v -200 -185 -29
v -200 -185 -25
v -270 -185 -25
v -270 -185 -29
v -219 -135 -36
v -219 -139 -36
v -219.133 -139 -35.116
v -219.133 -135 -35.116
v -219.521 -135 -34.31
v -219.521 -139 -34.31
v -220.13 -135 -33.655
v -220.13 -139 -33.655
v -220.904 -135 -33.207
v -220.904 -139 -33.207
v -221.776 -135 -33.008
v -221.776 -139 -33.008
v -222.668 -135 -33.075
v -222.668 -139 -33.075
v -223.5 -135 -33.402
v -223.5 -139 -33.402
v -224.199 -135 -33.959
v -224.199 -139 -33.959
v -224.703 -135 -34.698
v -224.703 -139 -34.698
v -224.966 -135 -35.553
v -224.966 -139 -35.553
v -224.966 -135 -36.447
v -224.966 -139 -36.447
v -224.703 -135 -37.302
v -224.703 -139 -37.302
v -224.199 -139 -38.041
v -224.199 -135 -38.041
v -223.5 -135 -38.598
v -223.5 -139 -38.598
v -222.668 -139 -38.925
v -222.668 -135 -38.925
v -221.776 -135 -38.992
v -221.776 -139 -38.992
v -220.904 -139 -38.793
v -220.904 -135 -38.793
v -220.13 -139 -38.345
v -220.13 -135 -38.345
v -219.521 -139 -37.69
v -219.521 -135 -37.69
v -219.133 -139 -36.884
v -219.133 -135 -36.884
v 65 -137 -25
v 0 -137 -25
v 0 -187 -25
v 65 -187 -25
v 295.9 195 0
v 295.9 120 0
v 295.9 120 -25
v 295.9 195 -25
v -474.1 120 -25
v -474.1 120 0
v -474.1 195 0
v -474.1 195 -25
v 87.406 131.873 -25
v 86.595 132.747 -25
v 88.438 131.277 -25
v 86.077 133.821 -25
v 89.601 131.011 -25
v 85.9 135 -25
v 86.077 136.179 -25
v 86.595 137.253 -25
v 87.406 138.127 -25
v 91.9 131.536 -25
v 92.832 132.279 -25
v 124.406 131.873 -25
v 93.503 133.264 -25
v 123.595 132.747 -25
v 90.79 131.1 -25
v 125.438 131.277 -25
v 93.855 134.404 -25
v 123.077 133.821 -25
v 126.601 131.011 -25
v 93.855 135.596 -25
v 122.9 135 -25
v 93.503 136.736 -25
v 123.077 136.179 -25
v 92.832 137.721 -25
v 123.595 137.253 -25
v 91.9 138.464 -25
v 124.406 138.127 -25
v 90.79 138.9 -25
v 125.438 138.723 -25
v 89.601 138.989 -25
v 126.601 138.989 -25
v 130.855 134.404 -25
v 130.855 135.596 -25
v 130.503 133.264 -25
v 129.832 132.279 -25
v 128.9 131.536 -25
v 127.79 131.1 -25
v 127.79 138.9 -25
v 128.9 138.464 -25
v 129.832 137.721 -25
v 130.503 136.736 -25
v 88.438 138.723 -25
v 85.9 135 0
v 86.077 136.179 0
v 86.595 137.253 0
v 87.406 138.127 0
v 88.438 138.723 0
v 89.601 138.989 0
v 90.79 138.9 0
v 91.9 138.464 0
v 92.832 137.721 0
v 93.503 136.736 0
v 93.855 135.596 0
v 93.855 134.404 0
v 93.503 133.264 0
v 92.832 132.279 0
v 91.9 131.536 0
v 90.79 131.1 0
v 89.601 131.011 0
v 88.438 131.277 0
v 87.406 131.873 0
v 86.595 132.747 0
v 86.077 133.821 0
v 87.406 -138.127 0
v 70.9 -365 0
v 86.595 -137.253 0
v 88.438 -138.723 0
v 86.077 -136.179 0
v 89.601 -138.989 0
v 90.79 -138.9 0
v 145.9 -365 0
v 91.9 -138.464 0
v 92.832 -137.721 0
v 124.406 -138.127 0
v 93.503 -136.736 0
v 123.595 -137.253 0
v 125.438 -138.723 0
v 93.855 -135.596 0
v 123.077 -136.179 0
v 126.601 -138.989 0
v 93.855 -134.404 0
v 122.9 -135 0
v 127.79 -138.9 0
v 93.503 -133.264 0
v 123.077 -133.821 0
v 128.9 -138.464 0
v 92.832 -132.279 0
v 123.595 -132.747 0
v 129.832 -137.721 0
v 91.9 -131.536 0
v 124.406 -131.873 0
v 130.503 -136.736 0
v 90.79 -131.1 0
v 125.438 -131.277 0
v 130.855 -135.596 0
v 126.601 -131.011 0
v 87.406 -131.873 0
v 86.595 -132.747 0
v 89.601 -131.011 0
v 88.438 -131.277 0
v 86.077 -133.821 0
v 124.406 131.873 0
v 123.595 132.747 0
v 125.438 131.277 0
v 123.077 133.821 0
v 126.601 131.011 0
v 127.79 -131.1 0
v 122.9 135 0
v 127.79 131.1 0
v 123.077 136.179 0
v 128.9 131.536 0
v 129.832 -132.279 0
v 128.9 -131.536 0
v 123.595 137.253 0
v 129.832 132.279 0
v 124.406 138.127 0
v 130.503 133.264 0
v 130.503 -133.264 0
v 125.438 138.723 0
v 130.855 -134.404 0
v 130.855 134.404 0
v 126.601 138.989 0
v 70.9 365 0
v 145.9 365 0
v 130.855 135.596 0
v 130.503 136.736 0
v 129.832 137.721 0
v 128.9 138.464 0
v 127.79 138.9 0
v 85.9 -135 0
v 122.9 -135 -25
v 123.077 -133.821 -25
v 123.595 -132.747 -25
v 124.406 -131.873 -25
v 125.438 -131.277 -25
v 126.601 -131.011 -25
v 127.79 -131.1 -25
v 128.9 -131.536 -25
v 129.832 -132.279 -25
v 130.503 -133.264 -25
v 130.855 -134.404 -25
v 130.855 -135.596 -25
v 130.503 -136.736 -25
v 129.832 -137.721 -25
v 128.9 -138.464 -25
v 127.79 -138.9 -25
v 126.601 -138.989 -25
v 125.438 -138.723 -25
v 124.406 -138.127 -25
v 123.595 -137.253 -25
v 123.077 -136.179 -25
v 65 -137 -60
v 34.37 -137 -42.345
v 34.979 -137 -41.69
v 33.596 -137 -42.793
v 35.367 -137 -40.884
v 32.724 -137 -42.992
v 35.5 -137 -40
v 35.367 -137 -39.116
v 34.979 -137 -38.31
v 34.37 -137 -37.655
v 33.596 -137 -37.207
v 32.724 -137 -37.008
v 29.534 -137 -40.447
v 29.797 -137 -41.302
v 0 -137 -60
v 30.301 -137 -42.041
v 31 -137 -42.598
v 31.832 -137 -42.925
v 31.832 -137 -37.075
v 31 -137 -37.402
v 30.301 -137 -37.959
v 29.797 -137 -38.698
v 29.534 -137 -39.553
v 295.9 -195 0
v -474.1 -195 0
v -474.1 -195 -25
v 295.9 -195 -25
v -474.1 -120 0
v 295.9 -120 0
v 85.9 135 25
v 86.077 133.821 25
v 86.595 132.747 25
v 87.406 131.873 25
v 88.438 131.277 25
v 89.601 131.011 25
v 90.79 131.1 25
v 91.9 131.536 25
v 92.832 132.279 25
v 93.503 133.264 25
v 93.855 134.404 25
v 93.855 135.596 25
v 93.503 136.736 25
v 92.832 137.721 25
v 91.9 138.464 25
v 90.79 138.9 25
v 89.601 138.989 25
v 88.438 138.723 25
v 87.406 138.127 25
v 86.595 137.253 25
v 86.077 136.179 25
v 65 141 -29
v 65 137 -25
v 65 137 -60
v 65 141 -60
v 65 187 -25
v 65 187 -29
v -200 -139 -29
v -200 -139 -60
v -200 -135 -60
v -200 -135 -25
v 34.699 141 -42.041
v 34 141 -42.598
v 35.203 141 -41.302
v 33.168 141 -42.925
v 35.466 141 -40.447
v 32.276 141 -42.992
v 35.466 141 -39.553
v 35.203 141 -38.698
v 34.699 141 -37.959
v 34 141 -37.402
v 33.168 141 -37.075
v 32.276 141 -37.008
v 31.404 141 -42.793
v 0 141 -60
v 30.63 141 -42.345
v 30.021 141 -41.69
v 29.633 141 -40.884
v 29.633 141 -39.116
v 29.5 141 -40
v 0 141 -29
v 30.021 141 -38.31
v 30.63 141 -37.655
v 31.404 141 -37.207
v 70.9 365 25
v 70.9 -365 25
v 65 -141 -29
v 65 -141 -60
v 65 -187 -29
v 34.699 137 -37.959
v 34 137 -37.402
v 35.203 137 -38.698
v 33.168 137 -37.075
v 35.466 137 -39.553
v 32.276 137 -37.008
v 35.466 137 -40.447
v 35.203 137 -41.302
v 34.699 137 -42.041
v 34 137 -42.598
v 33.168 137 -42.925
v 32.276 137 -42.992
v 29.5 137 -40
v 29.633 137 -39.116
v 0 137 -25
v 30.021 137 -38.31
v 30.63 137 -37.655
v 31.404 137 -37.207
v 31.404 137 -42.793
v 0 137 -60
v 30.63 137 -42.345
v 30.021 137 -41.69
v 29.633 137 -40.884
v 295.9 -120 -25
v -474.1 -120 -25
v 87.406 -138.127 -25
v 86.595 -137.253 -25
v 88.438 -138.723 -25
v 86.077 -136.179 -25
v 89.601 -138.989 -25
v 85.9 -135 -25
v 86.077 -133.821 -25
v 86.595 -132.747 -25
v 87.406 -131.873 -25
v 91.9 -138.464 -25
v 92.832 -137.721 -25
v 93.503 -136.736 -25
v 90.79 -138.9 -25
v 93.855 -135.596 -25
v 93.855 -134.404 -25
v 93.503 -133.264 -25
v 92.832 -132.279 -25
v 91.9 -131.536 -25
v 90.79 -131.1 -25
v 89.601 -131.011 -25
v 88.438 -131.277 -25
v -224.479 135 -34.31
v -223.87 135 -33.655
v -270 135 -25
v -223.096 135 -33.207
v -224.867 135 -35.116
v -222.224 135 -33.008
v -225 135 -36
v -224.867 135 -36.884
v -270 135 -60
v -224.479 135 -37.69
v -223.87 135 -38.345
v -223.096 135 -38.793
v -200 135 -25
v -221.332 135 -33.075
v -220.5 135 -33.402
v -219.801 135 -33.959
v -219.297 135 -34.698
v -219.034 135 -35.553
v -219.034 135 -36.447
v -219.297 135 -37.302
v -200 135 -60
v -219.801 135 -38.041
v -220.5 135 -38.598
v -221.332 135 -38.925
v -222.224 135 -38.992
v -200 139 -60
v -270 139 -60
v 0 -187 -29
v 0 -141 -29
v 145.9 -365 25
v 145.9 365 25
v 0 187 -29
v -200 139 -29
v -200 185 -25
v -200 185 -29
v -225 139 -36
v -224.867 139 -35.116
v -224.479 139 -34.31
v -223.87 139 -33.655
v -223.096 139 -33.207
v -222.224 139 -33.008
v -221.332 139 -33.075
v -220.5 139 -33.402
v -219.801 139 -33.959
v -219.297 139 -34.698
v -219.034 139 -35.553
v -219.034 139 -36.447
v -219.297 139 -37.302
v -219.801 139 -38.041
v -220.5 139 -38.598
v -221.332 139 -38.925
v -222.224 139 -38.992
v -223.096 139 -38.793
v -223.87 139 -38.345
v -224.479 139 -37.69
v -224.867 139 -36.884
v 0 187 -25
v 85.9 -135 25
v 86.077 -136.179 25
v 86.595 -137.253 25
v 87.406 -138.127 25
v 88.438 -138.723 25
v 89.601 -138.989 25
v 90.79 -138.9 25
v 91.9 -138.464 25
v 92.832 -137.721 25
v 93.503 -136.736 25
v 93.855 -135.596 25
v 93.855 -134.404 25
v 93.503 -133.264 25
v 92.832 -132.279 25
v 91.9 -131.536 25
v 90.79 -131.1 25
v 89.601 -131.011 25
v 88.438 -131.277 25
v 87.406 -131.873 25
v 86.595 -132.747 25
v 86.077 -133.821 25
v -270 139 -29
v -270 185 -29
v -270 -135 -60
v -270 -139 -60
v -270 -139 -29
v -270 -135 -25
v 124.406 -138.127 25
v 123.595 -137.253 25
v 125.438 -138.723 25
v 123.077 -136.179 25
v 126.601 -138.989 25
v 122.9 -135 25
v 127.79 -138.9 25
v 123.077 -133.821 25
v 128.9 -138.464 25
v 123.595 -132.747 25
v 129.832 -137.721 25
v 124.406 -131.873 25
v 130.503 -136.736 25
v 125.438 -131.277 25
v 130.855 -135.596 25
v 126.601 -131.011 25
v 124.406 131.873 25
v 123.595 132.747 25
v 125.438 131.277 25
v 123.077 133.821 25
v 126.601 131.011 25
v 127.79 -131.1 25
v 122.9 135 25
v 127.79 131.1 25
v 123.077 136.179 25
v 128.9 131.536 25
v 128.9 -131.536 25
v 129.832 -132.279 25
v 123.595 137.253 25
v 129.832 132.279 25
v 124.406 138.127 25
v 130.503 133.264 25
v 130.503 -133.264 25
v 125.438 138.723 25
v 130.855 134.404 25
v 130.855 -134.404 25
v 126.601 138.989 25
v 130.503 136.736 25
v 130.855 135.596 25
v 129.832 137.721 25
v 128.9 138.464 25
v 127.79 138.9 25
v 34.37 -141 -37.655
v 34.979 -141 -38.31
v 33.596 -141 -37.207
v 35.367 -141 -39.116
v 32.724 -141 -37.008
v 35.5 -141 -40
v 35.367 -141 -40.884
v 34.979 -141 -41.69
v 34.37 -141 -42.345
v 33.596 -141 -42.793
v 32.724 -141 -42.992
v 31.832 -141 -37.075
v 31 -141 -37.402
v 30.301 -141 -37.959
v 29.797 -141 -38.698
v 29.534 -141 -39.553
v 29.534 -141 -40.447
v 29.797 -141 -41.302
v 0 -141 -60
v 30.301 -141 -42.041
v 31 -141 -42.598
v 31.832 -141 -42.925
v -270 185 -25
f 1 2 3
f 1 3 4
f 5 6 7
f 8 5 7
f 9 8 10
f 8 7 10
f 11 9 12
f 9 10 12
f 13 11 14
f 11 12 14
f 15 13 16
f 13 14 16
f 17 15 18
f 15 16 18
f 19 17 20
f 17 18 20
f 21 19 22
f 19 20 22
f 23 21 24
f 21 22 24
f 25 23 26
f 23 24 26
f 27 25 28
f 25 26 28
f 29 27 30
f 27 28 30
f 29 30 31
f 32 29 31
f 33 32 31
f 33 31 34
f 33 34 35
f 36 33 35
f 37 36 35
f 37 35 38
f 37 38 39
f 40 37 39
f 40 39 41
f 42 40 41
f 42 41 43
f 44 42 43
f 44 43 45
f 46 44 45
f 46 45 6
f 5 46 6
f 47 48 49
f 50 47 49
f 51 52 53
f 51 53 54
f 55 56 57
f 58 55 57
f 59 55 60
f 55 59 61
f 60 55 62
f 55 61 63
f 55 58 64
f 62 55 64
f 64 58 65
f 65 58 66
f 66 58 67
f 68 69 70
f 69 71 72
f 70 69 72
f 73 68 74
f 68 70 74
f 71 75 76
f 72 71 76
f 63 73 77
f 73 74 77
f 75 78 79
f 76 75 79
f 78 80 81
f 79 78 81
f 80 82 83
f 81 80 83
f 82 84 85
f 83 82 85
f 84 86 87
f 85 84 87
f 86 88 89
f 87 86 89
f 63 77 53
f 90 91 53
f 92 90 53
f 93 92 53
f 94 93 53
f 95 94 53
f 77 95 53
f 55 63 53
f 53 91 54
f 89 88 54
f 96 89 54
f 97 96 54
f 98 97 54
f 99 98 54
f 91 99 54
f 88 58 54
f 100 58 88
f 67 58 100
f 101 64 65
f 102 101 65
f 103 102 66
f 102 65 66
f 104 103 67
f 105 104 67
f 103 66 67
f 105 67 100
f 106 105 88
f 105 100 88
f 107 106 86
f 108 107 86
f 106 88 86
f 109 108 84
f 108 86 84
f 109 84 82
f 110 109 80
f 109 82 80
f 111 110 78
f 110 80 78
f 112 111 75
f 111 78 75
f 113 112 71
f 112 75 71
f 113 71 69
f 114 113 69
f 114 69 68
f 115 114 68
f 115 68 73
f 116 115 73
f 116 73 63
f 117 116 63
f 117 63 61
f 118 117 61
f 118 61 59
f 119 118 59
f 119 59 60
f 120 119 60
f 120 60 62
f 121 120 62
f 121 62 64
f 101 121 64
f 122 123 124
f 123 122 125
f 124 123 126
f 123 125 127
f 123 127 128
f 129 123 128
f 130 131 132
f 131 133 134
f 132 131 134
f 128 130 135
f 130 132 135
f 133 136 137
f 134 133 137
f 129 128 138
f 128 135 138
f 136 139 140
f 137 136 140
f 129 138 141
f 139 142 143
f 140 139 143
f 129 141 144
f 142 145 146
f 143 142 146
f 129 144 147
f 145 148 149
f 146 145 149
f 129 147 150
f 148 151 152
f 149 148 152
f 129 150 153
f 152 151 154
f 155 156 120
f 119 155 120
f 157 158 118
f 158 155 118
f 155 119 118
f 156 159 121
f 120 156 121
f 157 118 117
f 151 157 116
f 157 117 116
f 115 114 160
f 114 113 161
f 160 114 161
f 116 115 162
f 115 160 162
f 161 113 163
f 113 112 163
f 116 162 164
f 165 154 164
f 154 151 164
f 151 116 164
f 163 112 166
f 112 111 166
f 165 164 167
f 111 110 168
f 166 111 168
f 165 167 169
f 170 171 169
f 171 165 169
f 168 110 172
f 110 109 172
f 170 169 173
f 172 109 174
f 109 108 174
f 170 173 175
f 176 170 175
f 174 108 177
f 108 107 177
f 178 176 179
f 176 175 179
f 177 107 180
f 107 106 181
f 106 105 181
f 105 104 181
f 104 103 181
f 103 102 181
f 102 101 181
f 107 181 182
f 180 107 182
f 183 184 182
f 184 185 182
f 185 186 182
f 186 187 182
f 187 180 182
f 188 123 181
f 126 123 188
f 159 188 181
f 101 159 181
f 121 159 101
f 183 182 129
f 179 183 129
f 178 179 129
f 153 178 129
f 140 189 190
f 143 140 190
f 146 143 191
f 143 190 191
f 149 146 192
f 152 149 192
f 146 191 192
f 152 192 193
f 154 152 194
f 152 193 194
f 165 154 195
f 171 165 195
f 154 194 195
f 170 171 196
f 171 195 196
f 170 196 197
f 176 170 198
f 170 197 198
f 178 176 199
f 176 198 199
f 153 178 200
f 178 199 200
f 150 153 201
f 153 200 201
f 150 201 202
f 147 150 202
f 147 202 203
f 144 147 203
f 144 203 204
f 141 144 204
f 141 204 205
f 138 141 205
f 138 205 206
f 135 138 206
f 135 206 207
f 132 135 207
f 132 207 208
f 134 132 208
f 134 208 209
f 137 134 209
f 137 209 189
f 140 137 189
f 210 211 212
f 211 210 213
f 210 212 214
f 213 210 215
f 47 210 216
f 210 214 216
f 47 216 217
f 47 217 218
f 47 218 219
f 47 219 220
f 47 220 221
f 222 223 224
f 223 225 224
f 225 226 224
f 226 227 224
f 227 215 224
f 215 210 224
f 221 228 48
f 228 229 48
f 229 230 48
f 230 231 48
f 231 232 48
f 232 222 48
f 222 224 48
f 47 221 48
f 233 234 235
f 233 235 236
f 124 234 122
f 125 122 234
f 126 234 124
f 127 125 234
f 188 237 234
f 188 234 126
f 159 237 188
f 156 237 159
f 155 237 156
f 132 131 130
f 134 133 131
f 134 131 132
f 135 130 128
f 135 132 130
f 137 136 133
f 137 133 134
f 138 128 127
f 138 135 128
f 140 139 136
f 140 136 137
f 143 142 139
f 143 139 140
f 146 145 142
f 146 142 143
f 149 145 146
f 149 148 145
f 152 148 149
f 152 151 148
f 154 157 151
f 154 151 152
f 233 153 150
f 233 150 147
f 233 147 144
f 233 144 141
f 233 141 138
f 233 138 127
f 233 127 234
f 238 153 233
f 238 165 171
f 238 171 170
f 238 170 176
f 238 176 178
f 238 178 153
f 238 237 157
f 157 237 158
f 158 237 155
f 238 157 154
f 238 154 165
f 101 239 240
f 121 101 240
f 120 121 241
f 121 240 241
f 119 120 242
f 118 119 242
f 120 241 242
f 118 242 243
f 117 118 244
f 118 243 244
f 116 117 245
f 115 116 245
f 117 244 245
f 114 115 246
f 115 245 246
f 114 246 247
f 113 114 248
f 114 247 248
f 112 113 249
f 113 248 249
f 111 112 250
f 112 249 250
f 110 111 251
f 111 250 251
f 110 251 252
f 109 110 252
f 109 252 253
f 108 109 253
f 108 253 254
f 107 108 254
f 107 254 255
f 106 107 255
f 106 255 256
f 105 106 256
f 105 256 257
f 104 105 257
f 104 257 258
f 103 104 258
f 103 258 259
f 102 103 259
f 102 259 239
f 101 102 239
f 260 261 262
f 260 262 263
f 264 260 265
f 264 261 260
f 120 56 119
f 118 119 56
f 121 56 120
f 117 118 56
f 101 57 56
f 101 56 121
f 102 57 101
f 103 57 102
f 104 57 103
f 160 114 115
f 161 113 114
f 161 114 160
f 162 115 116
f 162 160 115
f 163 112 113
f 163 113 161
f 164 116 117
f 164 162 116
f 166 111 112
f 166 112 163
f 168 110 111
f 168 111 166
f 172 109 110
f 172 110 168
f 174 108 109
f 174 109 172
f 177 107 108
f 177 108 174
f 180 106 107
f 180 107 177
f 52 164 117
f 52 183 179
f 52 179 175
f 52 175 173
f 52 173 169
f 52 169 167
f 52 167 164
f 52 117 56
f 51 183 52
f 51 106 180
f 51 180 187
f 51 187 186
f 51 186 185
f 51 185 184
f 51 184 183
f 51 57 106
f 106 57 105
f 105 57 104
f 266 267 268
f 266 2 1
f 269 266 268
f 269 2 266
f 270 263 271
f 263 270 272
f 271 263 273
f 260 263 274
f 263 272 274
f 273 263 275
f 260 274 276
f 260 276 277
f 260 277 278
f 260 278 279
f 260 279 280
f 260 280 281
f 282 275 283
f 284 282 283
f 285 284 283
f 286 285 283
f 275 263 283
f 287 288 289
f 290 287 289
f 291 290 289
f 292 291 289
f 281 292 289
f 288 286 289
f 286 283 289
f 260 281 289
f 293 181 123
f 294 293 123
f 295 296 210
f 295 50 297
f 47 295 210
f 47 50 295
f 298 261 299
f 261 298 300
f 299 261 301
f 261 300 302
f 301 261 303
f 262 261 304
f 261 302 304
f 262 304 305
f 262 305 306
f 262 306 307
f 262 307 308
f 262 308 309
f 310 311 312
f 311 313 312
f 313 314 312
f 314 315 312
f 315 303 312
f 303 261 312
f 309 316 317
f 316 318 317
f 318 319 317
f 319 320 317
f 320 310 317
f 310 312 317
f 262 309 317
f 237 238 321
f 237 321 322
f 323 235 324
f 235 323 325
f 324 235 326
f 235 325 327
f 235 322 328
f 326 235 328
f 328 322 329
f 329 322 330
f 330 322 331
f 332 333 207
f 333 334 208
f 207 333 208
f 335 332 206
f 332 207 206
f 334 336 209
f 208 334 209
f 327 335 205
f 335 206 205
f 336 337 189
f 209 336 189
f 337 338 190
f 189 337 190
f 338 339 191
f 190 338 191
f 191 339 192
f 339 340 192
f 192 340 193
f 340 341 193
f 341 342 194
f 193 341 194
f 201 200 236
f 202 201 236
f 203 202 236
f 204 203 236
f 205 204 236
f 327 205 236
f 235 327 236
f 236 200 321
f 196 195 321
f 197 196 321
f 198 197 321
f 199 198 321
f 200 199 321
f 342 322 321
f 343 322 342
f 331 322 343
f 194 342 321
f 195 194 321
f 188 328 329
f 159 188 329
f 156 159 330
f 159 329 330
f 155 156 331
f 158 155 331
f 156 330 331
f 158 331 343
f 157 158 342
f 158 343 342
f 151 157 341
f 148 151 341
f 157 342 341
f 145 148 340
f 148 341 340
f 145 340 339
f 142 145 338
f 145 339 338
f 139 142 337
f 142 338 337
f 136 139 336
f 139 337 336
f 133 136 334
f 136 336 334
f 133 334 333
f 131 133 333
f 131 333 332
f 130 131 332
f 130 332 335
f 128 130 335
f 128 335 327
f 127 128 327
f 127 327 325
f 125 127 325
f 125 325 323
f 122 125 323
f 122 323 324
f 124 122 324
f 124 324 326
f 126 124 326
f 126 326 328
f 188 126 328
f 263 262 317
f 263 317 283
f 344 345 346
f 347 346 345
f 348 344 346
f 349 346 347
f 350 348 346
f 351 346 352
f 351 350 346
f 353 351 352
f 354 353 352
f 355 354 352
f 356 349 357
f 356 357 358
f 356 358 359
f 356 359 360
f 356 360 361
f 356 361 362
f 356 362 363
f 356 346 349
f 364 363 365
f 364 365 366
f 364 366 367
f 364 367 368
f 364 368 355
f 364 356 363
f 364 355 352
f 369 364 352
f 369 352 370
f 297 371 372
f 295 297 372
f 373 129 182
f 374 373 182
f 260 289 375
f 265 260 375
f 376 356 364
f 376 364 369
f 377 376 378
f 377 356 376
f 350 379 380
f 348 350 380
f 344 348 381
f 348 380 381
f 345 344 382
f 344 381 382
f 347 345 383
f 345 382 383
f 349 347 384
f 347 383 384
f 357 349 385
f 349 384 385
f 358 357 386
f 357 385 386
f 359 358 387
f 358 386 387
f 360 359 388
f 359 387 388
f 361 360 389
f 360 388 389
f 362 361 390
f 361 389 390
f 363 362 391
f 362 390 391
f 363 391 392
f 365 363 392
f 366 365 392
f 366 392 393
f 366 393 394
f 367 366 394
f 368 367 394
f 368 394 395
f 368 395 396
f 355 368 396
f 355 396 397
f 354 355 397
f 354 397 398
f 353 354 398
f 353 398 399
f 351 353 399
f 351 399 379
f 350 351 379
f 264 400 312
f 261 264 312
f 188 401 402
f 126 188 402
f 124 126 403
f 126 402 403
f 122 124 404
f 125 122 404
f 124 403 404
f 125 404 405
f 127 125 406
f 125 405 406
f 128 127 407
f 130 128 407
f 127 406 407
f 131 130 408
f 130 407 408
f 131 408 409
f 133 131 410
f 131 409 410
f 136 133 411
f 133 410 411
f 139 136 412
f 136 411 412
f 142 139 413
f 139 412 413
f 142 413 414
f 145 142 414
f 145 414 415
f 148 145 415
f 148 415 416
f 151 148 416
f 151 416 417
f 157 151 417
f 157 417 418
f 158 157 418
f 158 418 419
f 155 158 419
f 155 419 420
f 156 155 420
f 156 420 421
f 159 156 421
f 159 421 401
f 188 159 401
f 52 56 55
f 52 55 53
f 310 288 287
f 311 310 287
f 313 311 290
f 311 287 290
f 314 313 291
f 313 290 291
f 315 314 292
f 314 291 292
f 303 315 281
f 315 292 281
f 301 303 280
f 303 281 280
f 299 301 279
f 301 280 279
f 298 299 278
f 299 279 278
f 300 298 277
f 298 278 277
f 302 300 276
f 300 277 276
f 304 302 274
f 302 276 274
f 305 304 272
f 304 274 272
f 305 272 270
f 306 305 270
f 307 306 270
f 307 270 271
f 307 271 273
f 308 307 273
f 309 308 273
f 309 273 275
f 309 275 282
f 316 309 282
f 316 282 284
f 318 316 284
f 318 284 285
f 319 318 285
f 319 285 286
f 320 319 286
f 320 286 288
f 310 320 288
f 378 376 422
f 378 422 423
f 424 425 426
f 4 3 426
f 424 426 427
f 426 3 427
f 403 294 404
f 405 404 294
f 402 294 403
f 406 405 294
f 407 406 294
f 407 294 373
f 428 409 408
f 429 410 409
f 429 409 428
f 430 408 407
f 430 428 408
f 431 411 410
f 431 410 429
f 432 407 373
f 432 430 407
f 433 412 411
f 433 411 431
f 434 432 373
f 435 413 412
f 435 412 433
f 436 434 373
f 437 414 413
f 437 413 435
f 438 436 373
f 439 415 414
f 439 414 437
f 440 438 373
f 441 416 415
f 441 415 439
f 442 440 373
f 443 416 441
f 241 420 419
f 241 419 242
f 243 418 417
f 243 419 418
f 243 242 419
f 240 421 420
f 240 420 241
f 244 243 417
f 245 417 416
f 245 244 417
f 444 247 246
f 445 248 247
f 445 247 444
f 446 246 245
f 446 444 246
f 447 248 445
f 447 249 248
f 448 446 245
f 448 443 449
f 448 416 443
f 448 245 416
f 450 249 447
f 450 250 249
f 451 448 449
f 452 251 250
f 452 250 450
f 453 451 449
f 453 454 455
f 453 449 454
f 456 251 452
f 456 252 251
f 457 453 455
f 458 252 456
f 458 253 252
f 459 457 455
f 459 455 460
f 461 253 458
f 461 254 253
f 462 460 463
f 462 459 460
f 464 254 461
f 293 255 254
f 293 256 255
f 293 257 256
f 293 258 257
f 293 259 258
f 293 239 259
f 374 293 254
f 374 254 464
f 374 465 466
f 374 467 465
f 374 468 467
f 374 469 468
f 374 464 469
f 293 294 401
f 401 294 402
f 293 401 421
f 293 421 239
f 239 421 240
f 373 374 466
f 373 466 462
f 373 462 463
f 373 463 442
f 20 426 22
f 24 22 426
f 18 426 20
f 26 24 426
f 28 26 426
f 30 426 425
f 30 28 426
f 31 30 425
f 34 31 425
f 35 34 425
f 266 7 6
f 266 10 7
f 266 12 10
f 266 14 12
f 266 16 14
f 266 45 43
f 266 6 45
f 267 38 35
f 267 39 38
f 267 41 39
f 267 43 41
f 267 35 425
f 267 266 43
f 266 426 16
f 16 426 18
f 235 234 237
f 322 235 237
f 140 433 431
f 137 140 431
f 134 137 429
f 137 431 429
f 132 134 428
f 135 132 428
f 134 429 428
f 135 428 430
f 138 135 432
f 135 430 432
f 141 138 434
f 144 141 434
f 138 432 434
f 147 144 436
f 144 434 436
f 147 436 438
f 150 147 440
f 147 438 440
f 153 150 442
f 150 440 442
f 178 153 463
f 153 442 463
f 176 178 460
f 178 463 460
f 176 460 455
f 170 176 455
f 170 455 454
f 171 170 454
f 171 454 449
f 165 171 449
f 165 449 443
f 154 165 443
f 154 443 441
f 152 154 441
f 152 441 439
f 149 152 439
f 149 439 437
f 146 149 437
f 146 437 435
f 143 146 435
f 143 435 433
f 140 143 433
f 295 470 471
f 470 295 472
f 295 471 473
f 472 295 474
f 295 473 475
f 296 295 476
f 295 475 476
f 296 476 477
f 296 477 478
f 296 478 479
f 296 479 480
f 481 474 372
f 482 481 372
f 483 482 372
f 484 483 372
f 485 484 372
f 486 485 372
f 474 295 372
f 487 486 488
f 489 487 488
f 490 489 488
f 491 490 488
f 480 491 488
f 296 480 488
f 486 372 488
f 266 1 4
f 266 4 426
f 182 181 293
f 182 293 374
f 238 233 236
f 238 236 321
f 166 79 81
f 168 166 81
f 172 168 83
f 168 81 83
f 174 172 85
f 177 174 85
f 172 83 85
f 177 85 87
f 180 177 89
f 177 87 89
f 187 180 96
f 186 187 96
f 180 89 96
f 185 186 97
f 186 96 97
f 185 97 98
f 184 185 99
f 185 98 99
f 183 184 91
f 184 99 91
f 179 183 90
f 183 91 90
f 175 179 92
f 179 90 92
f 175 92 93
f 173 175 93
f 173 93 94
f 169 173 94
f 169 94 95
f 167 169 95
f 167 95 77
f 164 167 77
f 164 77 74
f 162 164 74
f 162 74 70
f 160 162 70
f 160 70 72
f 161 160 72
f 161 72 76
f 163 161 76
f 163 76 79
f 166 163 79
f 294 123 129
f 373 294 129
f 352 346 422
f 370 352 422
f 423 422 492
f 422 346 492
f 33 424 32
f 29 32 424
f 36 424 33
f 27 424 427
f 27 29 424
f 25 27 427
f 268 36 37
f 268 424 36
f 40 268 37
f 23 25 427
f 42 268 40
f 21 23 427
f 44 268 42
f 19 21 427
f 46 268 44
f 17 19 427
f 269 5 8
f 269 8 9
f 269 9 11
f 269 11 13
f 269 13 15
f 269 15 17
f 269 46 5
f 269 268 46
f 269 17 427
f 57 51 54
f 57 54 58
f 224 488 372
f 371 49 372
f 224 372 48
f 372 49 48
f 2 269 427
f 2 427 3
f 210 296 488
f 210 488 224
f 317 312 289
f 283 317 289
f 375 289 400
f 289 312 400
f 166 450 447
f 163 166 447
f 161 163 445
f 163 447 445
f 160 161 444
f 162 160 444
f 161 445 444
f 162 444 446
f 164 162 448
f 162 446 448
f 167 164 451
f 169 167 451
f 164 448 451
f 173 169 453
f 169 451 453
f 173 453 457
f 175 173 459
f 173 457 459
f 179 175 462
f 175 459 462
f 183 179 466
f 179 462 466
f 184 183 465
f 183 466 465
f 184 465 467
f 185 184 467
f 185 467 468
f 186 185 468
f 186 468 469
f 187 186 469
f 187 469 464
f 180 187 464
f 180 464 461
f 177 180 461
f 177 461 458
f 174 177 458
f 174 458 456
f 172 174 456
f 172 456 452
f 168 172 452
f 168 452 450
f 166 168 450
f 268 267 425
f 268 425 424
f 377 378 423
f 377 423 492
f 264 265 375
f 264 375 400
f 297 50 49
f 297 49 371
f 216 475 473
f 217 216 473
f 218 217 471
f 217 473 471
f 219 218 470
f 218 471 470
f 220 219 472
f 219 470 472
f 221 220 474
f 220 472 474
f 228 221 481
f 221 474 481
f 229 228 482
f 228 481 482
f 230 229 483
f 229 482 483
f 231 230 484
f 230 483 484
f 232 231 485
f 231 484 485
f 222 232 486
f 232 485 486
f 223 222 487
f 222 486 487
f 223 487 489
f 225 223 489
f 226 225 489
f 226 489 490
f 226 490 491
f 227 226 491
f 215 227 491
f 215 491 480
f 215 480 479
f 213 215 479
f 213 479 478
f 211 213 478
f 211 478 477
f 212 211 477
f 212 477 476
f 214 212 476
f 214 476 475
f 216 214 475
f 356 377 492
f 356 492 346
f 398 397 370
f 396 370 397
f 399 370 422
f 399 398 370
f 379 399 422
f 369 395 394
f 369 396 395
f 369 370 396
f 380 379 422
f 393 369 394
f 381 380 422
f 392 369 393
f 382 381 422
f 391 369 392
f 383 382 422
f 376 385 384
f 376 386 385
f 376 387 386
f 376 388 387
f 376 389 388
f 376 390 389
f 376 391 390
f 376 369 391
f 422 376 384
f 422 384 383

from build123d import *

# Parameters (mm, degrees)
F0_W      = 545
F0_H      = 75
F0_W_2    = 75
F0_W_3    = 150
F1_DEPTH  = 25
F0_H_2    = 170
F0_H_3    = 240
F2_DEPTH  = 25
F3_D      = 8
F3_2_D    = 8
F4_D      = 8
F7_DEPTH  = 65
F9_D      = 6
F10_DEPTH = 65
F12_D     = 6
F16_DEPTH = 70
F17_DEPTH = 70
F19_D     = 6
F21_D     = 6


with BuildPart() as f1:
    # F0 (on Top) → F1 (new body)
    with BuildSketch(Plane.XY):
        with Locations((-201.6004703326, 157.5)):
            Rectangle(F0_W, F0_H)
        with Locations((108.3995296674, 157.5)):
            Rectangle(F0_W_2, F0_H)
        with Locations((220.8995296674, 157.5)):
            Rectangle(F0_W_3, F0_H)
    extrude(amount=-F1_DEPTH)

    # F3 (through all)
    with Locations(Plane.XY):
        with Locations((89.8995296674, 135), (126.8995296674, 135), (89.8995296674, -135), (126.8995296674, -135)):
            Hole(F3_D / 2)


with BuildPart() as f1b:
    # F0 (on Top) → F1, piece 2 (new body)
    with BuildSketch(Plane.XY):
        with Locations((-201.6004703326, -157.5)):
            Rectangle(F0_W, F0_H)
        with Locations((108.3995296674, -157.5)):
            Rectangle(F0_W_2, F0_H)
        with Locations((220.8995296674, -157.5)):
            Rectangle(F0_W_3, F0_H)
    extrude(amount=-F1_DEPTH)

    # F3#2 (through all)
    with Locations(Plane.XY):
        with Locations((89.8995296674, 135), (126.8995296674, 135), (89.8995296674, -135), (126.8995296674, -135)):
            Hole(F3_2_D / 2)


with BuildPart() as f2:
    # F0 (on Top) → F2 (new body)
    with BuildSketch(Plane.XY):
        with Locations((108.3995296674, 157.5)):
            Rectangle(F0_W_2, F0_H)
        with Locations((108.3995296674, 280)):
            Rectangle(F0_W_2, F0_H_2)
        with Locations((108.3995296674, 0)):
            Rectangle(F0_W_2, F0_H_3)
        with Locations((108.3995296674, -157.5)):
            Rectangle(F0_W_2, F0_H)
        with Locations((108.3995296674, -280)):
            Rectangle(F0_W_2, F0_H_2)
    extrude(amount=F2_DEPTH)

    # F4 (through all)
    with Locations(Plane(origin=(0, 0, 0), x_dir=(1, 0, 0), z_dir=(0, 0, -1))):
        with Locations((126.8995296674, 135), (89.8995296674, 135), (126.8995296674, -135), (89.8995296674, -135)):
            Hole(F4_D / 2)


with BuildPart() as f7:
    # F6 (on Right) → F7 (new body)
    with BuildSketch(Plane.YZ):
        Polygon((187, -29), (187, -25), (137, -25), (137, -60), (141, -60), (141, -29), align=None)
    extrude(amount=F7_DEPTH)

    # F9 (through all)
    with Locations(Plane.XZ.offset(-137)):
        with Locations((32.5, -40)):
            Hole(F9_D / 2)


with BuildPart() as f10:
    # F5 (on Right) → F10 (new body)
    with BuildSketch(Plane.YZ):
        Polygon((-141, -60), (-137, -60), (-137, -25), (-187, -25), (-187, -29), (-141, -29), align=None)
    extrude(amount=F10_DEPTH)

    # F12 (through all)
    with Locations(Plane(origin=(0, -137, 0), x_dir=(-1, 0, 0), z_dir=(0, 1, 0))):
        with Locations((-32.5, -40)):
            Hole(F12_D / 2)


with BuildPart() as f16:
    # F14 (on offset) → F16 (new body)
    with BuildSketch(Plane.YZ.offset(-200)):
        Polygon((-139, -60), (-135, -60), (-135, -25), (-185, -25), (-185, -29), (-139, -29), align=None)
    extrude(amount=-F16_DEPTH)

    # F19 (through all)
    with Locations(Plane(origin=(0, -135, 0), x_dir=(-1, 0, 0), z_dir=(0, 1, 0))):
        with Locations((222, -36)):
            Hole(F19_D / 2)


with BuildPart() as f17:
    # F15 (on offset) → F17 (new body)
    with BuildSketch(Plane.YZ.offset(-200)):
        Polygon((185, -29), (185, -25), (135, -25), (135, -60), (139, -60), (139, -29), align=None)
    extrude(amount=-F17_DEPTH)

    # F21 (through all)
    with Locations(Plane.XZ.offset(-135)):
        with Locations((-222, -36)):
            Hole(F21_D / 2)


solid = Compound([f1.part, f1b.part, f2.part, f7.part, f10.part, f16.part, f17.part])
